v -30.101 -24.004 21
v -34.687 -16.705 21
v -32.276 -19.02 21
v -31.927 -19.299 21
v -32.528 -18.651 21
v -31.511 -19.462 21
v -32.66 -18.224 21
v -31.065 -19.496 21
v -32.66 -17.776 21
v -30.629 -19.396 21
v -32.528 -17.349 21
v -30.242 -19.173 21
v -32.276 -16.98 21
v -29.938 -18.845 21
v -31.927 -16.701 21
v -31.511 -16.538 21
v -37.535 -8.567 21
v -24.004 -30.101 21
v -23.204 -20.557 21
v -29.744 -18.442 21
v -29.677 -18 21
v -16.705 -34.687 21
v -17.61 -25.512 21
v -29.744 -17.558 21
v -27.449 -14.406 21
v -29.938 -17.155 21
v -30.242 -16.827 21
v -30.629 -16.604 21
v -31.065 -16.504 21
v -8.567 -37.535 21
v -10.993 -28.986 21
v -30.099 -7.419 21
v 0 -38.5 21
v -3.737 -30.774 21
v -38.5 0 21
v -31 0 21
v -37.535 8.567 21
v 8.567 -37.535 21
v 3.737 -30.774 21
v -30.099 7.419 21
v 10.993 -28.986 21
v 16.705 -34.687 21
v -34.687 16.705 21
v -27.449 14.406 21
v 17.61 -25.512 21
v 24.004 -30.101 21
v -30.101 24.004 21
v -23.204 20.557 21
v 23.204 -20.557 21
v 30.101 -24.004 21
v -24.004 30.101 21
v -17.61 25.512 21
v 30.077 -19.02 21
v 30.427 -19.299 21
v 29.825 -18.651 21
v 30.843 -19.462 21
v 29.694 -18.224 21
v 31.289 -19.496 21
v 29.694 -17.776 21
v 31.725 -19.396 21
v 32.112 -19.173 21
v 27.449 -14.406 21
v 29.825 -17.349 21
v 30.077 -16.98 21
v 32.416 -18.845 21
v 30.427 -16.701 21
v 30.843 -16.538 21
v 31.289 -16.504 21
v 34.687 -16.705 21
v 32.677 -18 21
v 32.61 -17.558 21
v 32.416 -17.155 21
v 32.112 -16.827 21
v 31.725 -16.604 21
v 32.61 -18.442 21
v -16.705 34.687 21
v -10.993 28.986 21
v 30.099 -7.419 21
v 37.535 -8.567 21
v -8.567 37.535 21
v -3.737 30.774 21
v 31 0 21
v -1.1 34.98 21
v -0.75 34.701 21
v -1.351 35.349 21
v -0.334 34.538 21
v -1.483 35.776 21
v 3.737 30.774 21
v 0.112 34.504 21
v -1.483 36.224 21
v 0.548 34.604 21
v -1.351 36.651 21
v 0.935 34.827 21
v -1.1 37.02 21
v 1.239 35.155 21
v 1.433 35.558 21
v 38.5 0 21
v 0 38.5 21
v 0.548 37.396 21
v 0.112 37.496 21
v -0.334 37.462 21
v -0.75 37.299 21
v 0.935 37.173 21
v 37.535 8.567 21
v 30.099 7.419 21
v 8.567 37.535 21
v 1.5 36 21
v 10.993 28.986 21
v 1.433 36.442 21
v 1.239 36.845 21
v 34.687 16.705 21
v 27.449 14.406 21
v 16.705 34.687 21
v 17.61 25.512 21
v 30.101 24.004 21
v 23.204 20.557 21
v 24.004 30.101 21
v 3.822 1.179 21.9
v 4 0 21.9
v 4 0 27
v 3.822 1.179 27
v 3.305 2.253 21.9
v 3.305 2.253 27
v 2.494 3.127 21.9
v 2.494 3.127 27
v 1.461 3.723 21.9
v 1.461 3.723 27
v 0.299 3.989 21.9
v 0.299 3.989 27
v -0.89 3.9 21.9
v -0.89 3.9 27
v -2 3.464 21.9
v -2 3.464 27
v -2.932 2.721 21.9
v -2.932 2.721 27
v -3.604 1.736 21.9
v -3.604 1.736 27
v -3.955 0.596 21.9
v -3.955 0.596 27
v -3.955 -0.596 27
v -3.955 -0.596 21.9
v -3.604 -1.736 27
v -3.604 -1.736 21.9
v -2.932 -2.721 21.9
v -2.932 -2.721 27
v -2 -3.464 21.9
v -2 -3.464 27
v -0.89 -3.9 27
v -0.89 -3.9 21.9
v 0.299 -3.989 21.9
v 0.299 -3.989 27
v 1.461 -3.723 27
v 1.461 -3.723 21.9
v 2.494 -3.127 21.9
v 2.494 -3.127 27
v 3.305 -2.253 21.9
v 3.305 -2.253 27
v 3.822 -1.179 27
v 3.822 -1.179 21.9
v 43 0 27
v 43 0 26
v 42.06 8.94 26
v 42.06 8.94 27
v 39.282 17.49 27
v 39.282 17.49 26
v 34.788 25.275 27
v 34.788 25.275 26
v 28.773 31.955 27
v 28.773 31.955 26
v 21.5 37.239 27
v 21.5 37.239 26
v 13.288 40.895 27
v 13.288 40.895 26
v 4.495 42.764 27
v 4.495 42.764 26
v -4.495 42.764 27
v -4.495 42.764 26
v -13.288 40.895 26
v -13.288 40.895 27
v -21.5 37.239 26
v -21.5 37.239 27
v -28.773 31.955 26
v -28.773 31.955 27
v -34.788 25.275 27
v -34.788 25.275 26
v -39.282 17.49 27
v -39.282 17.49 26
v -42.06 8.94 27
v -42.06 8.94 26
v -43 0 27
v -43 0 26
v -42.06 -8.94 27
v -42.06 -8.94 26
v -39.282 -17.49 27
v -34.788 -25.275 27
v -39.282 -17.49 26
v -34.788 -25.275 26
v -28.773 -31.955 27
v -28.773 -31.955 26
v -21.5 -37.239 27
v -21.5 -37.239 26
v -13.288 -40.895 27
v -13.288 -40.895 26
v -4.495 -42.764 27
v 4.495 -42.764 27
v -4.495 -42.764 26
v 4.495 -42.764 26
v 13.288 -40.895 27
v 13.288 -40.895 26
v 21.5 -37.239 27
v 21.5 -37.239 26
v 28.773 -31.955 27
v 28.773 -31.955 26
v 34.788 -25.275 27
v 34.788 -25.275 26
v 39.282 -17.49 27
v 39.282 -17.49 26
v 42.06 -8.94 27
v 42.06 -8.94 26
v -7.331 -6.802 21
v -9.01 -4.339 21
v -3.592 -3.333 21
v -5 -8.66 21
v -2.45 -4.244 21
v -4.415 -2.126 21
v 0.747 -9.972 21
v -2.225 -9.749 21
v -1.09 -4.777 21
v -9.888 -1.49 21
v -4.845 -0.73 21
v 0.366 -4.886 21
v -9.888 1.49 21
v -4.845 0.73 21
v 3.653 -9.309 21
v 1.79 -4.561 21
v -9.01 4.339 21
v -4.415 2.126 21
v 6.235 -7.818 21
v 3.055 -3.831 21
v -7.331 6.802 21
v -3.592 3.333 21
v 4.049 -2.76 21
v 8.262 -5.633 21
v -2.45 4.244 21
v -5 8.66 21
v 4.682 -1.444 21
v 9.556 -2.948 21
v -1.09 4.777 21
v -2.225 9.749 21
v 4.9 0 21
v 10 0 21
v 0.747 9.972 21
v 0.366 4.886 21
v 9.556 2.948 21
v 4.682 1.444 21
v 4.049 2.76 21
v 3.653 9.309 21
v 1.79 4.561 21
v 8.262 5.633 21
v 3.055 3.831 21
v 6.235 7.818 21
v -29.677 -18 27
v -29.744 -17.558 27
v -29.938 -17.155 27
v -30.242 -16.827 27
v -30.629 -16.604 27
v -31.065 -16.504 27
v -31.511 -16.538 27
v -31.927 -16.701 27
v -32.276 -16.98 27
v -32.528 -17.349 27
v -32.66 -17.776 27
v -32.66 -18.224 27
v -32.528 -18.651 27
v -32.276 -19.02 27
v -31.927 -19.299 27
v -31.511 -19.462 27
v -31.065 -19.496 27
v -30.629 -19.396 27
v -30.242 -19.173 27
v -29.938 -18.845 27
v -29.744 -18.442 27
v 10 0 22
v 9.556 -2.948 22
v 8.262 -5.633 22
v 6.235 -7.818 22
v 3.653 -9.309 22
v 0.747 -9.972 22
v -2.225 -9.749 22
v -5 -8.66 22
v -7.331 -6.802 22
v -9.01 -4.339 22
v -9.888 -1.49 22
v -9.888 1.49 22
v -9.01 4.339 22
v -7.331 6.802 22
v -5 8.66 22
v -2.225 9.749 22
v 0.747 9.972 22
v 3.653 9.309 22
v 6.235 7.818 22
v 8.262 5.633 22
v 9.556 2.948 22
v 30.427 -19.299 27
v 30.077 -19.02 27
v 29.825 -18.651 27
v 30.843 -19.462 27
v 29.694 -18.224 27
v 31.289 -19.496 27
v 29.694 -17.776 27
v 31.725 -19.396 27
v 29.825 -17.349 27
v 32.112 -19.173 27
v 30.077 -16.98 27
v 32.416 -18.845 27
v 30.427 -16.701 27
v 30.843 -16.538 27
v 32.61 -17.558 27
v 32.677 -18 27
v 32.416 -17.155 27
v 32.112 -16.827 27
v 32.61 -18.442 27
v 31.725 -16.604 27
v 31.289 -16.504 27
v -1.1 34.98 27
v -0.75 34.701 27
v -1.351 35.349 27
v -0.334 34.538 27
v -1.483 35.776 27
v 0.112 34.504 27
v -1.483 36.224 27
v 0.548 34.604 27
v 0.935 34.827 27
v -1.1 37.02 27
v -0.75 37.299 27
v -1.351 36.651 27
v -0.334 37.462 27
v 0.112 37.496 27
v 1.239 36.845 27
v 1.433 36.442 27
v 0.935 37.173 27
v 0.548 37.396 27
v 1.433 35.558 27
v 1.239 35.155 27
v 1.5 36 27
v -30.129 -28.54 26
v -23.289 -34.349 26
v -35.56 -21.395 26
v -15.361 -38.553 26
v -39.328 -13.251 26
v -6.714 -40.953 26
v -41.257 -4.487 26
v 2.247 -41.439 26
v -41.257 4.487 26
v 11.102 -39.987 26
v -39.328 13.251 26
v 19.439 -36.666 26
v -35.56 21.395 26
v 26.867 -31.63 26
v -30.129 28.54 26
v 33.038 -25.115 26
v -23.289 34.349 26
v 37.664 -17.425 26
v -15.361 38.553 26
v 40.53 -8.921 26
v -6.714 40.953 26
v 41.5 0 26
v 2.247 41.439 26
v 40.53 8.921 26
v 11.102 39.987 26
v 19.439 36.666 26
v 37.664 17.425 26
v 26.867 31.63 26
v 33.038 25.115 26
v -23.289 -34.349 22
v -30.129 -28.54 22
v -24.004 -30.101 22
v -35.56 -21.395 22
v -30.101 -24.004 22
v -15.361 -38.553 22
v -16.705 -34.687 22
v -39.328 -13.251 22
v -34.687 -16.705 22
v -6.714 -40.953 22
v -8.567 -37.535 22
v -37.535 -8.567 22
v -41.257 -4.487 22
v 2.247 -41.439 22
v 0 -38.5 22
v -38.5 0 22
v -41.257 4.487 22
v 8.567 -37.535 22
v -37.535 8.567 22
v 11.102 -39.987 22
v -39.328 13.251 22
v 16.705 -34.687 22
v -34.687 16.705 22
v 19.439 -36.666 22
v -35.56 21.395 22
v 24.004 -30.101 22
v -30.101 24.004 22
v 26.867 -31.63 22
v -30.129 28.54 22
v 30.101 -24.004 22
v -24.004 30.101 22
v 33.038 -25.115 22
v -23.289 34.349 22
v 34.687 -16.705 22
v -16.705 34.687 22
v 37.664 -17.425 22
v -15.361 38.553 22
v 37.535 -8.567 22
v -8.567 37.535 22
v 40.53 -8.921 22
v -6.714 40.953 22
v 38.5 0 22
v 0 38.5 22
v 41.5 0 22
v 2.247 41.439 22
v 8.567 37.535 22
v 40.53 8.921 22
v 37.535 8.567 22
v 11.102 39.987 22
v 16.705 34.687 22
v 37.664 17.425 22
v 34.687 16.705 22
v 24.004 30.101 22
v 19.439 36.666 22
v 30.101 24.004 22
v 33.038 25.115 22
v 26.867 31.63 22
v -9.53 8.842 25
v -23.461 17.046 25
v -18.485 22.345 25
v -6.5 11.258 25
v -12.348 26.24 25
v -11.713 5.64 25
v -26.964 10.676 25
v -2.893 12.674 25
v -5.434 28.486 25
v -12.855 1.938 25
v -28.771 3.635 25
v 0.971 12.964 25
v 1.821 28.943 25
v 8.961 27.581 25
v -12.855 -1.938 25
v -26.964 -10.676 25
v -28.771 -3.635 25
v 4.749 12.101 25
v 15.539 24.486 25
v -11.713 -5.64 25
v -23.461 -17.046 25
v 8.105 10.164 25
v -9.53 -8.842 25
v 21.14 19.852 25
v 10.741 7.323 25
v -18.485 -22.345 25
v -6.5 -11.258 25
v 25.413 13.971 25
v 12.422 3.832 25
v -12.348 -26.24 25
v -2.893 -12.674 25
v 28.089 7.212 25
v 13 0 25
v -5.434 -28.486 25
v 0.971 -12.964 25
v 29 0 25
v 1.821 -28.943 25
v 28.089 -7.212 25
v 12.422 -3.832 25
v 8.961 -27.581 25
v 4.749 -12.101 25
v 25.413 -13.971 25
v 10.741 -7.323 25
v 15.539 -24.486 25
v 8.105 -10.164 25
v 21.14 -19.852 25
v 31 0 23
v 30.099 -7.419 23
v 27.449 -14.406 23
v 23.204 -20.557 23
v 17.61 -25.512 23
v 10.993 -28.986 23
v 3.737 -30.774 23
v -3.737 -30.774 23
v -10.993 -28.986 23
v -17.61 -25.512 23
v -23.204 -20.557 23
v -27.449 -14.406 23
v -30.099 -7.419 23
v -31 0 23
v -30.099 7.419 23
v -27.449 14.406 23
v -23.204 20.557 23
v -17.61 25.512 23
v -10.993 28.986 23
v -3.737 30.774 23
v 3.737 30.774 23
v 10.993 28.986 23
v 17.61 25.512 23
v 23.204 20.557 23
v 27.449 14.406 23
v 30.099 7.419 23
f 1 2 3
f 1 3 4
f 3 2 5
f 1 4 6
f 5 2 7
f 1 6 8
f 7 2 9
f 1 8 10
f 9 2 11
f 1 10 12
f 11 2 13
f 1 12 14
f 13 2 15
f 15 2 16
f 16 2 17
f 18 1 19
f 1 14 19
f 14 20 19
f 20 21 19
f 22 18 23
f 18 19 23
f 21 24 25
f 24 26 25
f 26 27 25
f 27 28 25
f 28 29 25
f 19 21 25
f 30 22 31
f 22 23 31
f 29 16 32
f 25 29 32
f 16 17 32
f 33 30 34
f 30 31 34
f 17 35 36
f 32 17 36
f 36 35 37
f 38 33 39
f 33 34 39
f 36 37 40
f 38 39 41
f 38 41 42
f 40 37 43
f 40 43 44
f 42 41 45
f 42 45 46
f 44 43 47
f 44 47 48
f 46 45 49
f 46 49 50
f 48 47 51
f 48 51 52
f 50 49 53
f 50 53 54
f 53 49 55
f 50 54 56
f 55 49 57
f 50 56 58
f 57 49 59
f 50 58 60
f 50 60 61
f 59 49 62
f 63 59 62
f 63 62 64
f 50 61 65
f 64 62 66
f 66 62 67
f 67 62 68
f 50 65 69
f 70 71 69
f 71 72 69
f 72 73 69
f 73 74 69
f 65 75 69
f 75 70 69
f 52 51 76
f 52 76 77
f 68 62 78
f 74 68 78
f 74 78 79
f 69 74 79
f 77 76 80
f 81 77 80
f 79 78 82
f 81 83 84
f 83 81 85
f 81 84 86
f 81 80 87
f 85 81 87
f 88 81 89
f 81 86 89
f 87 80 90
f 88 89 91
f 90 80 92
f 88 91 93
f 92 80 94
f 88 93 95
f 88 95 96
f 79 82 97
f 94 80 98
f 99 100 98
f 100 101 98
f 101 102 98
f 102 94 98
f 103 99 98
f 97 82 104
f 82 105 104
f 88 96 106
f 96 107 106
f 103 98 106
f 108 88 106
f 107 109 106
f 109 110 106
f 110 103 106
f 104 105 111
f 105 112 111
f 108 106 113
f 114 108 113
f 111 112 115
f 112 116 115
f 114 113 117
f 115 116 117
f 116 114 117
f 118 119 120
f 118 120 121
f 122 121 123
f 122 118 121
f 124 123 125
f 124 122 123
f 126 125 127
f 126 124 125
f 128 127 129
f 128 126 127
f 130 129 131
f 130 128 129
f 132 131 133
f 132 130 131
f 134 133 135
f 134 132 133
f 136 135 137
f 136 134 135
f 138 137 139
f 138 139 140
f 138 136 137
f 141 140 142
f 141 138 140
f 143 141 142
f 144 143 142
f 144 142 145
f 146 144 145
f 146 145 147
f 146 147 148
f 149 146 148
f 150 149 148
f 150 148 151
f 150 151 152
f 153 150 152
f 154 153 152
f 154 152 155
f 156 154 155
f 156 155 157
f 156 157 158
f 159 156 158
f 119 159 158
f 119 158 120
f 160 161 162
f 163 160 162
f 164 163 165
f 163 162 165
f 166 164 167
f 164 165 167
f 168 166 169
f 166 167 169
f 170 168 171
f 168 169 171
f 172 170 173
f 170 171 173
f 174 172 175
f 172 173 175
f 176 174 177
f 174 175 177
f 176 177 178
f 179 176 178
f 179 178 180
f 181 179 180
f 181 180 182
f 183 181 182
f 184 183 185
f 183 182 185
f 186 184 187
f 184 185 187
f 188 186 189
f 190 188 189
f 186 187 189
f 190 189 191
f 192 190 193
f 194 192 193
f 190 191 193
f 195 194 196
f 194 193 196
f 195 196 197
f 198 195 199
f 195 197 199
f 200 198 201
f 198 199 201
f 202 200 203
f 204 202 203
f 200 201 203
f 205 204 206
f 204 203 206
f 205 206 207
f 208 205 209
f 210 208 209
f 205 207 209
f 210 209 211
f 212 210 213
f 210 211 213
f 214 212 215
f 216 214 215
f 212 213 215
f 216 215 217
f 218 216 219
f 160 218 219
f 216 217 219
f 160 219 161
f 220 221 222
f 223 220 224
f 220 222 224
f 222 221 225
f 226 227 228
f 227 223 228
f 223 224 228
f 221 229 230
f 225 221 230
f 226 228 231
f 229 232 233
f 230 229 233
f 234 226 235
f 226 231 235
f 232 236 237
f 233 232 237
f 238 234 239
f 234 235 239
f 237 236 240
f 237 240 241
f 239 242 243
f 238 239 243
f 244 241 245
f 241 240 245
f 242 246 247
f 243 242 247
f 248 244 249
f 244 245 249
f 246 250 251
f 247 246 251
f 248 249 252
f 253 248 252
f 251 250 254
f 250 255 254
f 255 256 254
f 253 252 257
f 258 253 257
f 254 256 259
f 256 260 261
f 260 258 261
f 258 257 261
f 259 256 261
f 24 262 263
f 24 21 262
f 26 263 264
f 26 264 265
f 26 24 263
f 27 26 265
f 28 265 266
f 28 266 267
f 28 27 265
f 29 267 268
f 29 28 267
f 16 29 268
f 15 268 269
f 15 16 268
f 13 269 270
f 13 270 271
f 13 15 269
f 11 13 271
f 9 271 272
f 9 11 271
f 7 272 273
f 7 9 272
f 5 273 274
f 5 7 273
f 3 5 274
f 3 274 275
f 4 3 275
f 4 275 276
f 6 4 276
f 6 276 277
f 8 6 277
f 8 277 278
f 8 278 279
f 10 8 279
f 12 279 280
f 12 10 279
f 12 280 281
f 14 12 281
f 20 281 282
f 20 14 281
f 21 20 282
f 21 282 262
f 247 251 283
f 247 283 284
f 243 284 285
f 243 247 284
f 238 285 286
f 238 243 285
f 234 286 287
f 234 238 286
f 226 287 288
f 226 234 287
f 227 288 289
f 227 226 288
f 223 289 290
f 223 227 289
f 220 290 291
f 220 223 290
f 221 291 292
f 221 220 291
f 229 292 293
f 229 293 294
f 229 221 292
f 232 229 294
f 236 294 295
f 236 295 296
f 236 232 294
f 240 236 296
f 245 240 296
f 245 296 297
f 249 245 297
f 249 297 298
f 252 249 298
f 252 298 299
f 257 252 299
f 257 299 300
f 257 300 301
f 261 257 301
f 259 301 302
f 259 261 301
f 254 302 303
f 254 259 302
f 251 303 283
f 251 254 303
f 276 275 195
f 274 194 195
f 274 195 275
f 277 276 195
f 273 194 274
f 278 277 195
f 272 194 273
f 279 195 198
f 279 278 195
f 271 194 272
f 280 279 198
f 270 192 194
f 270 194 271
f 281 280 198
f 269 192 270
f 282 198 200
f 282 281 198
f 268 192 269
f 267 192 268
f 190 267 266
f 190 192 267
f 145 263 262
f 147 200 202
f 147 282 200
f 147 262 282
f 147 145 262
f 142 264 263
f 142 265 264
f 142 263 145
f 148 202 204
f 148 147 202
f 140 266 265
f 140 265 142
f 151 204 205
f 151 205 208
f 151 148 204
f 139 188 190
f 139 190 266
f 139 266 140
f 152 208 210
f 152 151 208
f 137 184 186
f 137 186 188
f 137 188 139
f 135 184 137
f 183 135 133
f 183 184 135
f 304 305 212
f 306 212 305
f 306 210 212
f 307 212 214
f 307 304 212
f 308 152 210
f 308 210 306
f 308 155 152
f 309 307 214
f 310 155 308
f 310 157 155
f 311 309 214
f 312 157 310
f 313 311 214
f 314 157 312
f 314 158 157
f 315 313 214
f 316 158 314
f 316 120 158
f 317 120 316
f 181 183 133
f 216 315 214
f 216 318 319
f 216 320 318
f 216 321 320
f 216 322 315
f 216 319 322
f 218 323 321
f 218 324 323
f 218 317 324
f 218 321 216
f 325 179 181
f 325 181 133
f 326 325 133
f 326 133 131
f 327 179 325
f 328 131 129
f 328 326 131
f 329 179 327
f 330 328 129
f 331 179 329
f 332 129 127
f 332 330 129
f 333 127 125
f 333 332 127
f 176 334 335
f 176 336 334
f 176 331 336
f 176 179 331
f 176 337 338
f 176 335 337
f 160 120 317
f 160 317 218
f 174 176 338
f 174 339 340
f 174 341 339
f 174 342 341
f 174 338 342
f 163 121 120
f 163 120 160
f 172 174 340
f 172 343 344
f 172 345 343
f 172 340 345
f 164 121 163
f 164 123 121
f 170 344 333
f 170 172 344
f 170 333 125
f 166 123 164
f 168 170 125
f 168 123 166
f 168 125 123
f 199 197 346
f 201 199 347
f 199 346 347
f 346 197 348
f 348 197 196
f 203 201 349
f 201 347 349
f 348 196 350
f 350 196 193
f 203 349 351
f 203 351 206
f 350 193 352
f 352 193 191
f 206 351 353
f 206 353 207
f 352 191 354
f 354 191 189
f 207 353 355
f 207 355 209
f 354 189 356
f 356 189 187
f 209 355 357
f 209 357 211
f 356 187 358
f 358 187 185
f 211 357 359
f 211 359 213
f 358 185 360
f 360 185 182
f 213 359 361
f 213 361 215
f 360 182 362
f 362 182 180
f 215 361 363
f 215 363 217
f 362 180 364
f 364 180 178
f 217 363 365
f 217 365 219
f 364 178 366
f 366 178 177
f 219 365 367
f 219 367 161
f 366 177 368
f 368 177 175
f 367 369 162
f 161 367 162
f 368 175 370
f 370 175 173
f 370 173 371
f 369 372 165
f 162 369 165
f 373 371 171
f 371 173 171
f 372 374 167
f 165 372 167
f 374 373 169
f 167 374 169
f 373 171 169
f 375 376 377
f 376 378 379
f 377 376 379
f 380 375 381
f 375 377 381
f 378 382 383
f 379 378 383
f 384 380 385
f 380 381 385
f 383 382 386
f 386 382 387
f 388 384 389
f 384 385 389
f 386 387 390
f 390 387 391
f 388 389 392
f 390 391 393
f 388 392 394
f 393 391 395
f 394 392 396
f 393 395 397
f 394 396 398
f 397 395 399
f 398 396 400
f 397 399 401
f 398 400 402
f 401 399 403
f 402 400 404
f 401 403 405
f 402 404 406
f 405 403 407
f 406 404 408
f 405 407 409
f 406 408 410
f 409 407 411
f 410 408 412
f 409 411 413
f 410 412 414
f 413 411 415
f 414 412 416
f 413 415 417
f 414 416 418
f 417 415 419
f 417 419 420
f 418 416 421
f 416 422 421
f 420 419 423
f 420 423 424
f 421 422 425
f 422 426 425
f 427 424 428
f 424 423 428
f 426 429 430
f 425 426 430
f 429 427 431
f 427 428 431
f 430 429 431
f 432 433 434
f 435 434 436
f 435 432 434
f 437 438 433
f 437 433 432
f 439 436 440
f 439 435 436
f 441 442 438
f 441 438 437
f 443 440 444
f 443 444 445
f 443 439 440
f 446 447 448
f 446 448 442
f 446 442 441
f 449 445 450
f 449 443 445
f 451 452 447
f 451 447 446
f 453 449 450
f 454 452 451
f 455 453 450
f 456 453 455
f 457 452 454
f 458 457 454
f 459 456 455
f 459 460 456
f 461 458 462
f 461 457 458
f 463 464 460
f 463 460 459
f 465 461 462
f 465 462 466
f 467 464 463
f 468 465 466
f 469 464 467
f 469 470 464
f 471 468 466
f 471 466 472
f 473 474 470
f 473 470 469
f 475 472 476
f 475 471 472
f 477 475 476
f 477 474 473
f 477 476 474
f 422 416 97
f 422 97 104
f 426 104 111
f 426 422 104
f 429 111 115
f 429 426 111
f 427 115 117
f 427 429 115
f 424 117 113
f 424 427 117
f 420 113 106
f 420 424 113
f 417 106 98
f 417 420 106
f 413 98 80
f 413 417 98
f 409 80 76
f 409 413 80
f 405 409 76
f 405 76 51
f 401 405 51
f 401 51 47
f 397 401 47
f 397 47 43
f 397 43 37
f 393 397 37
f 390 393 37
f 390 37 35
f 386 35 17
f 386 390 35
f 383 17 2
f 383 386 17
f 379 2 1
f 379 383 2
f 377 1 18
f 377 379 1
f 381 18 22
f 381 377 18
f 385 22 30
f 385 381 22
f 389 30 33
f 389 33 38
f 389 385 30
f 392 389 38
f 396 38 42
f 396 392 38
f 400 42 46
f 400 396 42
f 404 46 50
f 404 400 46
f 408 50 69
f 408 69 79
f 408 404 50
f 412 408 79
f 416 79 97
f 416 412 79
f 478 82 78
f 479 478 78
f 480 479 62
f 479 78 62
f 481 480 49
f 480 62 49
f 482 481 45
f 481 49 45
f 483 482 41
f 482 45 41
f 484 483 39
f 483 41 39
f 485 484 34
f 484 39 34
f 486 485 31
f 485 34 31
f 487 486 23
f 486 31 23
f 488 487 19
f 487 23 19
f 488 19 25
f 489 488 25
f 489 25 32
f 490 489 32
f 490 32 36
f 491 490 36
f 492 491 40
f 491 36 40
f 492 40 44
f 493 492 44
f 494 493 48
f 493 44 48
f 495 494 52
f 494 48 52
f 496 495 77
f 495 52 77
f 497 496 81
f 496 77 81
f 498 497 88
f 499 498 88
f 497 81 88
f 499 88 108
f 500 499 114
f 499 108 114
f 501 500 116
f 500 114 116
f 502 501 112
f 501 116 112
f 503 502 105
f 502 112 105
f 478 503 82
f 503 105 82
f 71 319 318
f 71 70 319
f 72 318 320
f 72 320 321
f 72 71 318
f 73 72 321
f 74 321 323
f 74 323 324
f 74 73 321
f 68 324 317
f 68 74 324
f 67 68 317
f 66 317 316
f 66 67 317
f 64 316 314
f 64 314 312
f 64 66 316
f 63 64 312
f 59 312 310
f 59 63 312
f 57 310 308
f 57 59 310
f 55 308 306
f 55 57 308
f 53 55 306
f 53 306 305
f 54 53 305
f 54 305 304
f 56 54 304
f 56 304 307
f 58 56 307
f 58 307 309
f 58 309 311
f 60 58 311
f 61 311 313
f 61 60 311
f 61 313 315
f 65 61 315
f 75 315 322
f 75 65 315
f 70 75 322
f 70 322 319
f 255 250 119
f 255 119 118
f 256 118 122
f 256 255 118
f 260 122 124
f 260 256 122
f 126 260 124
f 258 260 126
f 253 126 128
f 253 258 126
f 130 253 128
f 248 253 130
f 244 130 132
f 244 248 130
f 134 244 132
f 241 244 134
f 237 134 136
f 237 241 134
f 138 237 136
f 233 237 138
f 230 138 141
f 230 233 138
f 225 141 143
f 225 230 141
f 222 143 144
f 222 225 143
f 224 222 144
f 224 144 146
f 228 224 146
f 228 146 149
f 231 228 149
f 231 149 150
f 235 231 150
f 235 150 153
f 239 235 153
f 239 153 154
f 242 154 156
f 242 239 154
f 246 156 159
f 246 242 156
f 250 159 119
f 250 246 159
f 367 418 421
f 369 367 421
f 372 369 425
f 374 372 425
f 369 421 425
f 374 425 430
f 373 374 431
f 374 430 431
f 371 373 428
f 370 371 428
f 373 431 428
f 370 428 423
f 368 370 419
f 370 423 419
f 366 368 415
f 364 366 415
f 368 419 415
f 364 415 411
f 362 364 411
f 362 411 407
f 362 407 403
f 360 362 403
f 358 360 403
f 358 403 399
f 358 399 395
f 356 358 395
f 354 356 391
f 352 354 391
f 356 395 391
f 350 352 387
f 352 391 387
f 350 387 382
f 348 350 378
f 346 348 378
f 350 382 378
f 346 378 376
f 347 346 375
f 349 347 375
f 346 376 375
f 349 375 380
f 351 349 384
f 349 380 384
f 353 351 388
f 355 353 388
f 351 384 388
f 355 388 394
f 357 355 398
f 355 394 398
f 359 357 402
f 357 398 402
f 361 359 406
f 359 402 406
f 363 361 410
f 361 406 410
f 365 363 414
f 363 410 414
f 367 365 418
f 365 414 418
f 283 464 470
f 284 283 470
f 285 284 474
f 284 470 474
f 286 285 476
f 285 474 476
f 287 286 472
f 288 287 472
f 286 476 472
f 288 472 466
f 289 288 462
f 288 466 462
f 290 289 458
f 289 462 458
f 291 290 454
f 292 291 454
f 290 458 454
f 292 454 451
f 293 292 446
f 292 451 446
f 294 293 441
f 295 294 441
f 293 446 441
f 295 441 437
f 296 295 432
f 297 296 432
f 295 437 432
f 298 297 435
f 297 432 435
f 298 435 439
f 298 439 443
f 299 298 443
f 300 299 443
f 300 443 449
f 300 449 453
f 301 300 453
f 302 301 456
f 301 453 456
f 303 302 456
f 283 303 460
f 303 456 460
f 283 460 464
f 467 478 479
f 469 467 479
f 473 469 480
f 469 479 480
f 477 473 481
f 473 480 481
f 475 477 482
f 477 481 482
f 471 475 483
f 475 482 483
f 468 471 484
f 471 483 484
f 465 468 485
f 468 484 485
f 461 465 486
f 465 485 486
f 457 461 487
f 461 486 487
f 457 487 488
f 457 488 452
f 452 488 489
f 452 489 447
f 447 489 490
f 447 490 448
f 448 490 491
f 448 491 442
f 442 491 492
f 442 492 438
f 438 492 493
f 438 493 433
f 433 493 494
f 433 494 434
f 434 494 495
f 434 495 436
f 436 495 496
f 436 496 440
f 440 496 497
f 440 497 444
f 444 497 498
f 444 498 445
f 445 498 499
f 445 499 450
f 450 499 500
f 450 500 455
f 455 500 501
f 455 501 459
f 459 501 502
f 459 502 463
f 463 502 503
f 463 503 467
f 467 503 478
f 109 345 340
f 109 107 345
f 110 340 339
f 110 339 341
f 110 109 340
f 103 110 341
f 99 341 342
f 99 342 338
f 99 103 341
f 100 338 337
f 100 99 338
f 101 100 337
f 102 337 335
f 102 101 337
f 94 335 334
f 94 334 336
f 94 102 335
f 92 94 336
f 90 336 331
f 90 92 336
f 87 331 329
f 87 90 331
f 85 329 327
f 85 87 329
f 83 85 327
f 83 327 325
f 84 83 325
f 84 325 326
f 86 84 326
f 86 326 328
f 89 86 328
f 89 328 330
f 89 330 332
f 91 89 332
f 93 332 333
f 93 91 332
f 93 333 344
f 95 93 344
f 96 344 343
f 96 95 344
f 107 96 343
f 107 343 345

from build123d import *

# Parameters (mm, degrees)
SKETCH006_R     = 41.5
SKETCH006_R_2   = 1.5
SKETCH006_R_3   = 4
PAD_DEPTH       = 4
SKETCH007_R     = 38.5
SKETCH007_R_2   = 1.5
SKETCH007_R_3   = 4
PAD001_DEPTH    = 1
SKETCH008_R     = 43
SKETCH008_R_2   = 1.5
SKETCH008_R_3   = 4
PAD002_DEPTH    = 1
SKETCH_R        = 31
SKETCH_R_2      = 10
POCKET_DEPTH    = 4
CHAMFER_SIZE    = 0.9
CHAMFER001_SIZE = 3
CHAMFER002_SIZE = 2


with BuildPart() as part:
    # Sketch006 → Pad (new body)
    with BuildSketch(Plane.XY.offset(22)):
        Circle(SKETCH006_R)
        with Locations((0, 36)):
            Circle(SKETCH006_R_2, mode=Mode.SUBTRACT)
        with Locations((31.176915, -18)):
            Circle(SKETCH006_R_2, mode=Mode.SUBTRACT)
        with Locations((-31.176915, -18)):
            Circle(SKETCH006_R_2, mode=Mode.SUBTRACT)
        Circle(SKETCH006_R_3, mode=Mode.SUBTRACT)
    extrude(amount=PAD_DEPTH)

    # Sketch007 → Pad001 (join)
    with BuildSketch(Plane.XY.offset(22)):
        Circle(SKETCH007_R)
        with Locations((0, 36)):
            Circle(SKETCH007_R_2, mode=Mode.SUBTRACT)
        with Locations((31.176915, -18)):
            Circle(SKETCH007_R_2, mode=Mode.SUBTRACT)
        with Locations((-31.176915, -18)):
            Circle(SKETCH007_R_2, mode=Mode.SUBTRACT)
        Circle(SKETCH007_R_3, mode=Mode.SUBTRACT)
    extrude(amount=-PAD001_DEPTH)

    # Sketch008 → Pad002 (join)
    with BuildSketch(Plane.XY.offset(26)):
        Circle(SKETCH008_R)
        with Locations((0, 36)):
            Circle(SKETCH008_R_2, mode=Mode.SUBTRACT)
        with Locations((31.176915, -18)):
            Circle(SKETCH008_R_2, mode=Mode.SUBTRACT)
        with Locations((-31.176915, -18)):
            Circle(SKETCH008_R_2, mode=Mode.SUBTRACT)
        Circle(SKETCH008_R_3, mode=Mode.SUBTRACT)
    extrude(amount=PAD002_DEPTH)

    # Sketch (on Face6 of Pad002) → Pocket (cut)
    with BuildSketch(Plane(origin=(0, 0, 21), x_dir=(1, 0, 0), z_dir=(0, 0, -1))):
        Circle(SKETCH_R)
        Circle(SKETCH_R_2, mode=Mode.SUBTRACT)
    extrude(amount=-POCKET_DEPTH, mode=Mode.SUBTRACT)

    # Chamfer
    chamfer_edges = [part.edges().sort_by_distance(p)[0] for p in [
        (-4, 0, 21),
    ]]
    chamfer(chamfer_edges, length=CHAMFER_SIZE)

    # Chamfer001
    chamfer001_edges = [part.edges().sort_by_distance(p)[0] for p in [
        (-10, 0, 25),
    ]]
    chamfer(chamfer001_edges, length=CHAMFER001_SIZE)

    # Chamfer002
    chamfer002_edges = [part.edges().sort_by_distance(p)[0] for p in [
        (-31, 0, 25),
    ]]
    chamfer(chamfer002_edges, length=CHAMFER002_SIZE)


solid = part.part
